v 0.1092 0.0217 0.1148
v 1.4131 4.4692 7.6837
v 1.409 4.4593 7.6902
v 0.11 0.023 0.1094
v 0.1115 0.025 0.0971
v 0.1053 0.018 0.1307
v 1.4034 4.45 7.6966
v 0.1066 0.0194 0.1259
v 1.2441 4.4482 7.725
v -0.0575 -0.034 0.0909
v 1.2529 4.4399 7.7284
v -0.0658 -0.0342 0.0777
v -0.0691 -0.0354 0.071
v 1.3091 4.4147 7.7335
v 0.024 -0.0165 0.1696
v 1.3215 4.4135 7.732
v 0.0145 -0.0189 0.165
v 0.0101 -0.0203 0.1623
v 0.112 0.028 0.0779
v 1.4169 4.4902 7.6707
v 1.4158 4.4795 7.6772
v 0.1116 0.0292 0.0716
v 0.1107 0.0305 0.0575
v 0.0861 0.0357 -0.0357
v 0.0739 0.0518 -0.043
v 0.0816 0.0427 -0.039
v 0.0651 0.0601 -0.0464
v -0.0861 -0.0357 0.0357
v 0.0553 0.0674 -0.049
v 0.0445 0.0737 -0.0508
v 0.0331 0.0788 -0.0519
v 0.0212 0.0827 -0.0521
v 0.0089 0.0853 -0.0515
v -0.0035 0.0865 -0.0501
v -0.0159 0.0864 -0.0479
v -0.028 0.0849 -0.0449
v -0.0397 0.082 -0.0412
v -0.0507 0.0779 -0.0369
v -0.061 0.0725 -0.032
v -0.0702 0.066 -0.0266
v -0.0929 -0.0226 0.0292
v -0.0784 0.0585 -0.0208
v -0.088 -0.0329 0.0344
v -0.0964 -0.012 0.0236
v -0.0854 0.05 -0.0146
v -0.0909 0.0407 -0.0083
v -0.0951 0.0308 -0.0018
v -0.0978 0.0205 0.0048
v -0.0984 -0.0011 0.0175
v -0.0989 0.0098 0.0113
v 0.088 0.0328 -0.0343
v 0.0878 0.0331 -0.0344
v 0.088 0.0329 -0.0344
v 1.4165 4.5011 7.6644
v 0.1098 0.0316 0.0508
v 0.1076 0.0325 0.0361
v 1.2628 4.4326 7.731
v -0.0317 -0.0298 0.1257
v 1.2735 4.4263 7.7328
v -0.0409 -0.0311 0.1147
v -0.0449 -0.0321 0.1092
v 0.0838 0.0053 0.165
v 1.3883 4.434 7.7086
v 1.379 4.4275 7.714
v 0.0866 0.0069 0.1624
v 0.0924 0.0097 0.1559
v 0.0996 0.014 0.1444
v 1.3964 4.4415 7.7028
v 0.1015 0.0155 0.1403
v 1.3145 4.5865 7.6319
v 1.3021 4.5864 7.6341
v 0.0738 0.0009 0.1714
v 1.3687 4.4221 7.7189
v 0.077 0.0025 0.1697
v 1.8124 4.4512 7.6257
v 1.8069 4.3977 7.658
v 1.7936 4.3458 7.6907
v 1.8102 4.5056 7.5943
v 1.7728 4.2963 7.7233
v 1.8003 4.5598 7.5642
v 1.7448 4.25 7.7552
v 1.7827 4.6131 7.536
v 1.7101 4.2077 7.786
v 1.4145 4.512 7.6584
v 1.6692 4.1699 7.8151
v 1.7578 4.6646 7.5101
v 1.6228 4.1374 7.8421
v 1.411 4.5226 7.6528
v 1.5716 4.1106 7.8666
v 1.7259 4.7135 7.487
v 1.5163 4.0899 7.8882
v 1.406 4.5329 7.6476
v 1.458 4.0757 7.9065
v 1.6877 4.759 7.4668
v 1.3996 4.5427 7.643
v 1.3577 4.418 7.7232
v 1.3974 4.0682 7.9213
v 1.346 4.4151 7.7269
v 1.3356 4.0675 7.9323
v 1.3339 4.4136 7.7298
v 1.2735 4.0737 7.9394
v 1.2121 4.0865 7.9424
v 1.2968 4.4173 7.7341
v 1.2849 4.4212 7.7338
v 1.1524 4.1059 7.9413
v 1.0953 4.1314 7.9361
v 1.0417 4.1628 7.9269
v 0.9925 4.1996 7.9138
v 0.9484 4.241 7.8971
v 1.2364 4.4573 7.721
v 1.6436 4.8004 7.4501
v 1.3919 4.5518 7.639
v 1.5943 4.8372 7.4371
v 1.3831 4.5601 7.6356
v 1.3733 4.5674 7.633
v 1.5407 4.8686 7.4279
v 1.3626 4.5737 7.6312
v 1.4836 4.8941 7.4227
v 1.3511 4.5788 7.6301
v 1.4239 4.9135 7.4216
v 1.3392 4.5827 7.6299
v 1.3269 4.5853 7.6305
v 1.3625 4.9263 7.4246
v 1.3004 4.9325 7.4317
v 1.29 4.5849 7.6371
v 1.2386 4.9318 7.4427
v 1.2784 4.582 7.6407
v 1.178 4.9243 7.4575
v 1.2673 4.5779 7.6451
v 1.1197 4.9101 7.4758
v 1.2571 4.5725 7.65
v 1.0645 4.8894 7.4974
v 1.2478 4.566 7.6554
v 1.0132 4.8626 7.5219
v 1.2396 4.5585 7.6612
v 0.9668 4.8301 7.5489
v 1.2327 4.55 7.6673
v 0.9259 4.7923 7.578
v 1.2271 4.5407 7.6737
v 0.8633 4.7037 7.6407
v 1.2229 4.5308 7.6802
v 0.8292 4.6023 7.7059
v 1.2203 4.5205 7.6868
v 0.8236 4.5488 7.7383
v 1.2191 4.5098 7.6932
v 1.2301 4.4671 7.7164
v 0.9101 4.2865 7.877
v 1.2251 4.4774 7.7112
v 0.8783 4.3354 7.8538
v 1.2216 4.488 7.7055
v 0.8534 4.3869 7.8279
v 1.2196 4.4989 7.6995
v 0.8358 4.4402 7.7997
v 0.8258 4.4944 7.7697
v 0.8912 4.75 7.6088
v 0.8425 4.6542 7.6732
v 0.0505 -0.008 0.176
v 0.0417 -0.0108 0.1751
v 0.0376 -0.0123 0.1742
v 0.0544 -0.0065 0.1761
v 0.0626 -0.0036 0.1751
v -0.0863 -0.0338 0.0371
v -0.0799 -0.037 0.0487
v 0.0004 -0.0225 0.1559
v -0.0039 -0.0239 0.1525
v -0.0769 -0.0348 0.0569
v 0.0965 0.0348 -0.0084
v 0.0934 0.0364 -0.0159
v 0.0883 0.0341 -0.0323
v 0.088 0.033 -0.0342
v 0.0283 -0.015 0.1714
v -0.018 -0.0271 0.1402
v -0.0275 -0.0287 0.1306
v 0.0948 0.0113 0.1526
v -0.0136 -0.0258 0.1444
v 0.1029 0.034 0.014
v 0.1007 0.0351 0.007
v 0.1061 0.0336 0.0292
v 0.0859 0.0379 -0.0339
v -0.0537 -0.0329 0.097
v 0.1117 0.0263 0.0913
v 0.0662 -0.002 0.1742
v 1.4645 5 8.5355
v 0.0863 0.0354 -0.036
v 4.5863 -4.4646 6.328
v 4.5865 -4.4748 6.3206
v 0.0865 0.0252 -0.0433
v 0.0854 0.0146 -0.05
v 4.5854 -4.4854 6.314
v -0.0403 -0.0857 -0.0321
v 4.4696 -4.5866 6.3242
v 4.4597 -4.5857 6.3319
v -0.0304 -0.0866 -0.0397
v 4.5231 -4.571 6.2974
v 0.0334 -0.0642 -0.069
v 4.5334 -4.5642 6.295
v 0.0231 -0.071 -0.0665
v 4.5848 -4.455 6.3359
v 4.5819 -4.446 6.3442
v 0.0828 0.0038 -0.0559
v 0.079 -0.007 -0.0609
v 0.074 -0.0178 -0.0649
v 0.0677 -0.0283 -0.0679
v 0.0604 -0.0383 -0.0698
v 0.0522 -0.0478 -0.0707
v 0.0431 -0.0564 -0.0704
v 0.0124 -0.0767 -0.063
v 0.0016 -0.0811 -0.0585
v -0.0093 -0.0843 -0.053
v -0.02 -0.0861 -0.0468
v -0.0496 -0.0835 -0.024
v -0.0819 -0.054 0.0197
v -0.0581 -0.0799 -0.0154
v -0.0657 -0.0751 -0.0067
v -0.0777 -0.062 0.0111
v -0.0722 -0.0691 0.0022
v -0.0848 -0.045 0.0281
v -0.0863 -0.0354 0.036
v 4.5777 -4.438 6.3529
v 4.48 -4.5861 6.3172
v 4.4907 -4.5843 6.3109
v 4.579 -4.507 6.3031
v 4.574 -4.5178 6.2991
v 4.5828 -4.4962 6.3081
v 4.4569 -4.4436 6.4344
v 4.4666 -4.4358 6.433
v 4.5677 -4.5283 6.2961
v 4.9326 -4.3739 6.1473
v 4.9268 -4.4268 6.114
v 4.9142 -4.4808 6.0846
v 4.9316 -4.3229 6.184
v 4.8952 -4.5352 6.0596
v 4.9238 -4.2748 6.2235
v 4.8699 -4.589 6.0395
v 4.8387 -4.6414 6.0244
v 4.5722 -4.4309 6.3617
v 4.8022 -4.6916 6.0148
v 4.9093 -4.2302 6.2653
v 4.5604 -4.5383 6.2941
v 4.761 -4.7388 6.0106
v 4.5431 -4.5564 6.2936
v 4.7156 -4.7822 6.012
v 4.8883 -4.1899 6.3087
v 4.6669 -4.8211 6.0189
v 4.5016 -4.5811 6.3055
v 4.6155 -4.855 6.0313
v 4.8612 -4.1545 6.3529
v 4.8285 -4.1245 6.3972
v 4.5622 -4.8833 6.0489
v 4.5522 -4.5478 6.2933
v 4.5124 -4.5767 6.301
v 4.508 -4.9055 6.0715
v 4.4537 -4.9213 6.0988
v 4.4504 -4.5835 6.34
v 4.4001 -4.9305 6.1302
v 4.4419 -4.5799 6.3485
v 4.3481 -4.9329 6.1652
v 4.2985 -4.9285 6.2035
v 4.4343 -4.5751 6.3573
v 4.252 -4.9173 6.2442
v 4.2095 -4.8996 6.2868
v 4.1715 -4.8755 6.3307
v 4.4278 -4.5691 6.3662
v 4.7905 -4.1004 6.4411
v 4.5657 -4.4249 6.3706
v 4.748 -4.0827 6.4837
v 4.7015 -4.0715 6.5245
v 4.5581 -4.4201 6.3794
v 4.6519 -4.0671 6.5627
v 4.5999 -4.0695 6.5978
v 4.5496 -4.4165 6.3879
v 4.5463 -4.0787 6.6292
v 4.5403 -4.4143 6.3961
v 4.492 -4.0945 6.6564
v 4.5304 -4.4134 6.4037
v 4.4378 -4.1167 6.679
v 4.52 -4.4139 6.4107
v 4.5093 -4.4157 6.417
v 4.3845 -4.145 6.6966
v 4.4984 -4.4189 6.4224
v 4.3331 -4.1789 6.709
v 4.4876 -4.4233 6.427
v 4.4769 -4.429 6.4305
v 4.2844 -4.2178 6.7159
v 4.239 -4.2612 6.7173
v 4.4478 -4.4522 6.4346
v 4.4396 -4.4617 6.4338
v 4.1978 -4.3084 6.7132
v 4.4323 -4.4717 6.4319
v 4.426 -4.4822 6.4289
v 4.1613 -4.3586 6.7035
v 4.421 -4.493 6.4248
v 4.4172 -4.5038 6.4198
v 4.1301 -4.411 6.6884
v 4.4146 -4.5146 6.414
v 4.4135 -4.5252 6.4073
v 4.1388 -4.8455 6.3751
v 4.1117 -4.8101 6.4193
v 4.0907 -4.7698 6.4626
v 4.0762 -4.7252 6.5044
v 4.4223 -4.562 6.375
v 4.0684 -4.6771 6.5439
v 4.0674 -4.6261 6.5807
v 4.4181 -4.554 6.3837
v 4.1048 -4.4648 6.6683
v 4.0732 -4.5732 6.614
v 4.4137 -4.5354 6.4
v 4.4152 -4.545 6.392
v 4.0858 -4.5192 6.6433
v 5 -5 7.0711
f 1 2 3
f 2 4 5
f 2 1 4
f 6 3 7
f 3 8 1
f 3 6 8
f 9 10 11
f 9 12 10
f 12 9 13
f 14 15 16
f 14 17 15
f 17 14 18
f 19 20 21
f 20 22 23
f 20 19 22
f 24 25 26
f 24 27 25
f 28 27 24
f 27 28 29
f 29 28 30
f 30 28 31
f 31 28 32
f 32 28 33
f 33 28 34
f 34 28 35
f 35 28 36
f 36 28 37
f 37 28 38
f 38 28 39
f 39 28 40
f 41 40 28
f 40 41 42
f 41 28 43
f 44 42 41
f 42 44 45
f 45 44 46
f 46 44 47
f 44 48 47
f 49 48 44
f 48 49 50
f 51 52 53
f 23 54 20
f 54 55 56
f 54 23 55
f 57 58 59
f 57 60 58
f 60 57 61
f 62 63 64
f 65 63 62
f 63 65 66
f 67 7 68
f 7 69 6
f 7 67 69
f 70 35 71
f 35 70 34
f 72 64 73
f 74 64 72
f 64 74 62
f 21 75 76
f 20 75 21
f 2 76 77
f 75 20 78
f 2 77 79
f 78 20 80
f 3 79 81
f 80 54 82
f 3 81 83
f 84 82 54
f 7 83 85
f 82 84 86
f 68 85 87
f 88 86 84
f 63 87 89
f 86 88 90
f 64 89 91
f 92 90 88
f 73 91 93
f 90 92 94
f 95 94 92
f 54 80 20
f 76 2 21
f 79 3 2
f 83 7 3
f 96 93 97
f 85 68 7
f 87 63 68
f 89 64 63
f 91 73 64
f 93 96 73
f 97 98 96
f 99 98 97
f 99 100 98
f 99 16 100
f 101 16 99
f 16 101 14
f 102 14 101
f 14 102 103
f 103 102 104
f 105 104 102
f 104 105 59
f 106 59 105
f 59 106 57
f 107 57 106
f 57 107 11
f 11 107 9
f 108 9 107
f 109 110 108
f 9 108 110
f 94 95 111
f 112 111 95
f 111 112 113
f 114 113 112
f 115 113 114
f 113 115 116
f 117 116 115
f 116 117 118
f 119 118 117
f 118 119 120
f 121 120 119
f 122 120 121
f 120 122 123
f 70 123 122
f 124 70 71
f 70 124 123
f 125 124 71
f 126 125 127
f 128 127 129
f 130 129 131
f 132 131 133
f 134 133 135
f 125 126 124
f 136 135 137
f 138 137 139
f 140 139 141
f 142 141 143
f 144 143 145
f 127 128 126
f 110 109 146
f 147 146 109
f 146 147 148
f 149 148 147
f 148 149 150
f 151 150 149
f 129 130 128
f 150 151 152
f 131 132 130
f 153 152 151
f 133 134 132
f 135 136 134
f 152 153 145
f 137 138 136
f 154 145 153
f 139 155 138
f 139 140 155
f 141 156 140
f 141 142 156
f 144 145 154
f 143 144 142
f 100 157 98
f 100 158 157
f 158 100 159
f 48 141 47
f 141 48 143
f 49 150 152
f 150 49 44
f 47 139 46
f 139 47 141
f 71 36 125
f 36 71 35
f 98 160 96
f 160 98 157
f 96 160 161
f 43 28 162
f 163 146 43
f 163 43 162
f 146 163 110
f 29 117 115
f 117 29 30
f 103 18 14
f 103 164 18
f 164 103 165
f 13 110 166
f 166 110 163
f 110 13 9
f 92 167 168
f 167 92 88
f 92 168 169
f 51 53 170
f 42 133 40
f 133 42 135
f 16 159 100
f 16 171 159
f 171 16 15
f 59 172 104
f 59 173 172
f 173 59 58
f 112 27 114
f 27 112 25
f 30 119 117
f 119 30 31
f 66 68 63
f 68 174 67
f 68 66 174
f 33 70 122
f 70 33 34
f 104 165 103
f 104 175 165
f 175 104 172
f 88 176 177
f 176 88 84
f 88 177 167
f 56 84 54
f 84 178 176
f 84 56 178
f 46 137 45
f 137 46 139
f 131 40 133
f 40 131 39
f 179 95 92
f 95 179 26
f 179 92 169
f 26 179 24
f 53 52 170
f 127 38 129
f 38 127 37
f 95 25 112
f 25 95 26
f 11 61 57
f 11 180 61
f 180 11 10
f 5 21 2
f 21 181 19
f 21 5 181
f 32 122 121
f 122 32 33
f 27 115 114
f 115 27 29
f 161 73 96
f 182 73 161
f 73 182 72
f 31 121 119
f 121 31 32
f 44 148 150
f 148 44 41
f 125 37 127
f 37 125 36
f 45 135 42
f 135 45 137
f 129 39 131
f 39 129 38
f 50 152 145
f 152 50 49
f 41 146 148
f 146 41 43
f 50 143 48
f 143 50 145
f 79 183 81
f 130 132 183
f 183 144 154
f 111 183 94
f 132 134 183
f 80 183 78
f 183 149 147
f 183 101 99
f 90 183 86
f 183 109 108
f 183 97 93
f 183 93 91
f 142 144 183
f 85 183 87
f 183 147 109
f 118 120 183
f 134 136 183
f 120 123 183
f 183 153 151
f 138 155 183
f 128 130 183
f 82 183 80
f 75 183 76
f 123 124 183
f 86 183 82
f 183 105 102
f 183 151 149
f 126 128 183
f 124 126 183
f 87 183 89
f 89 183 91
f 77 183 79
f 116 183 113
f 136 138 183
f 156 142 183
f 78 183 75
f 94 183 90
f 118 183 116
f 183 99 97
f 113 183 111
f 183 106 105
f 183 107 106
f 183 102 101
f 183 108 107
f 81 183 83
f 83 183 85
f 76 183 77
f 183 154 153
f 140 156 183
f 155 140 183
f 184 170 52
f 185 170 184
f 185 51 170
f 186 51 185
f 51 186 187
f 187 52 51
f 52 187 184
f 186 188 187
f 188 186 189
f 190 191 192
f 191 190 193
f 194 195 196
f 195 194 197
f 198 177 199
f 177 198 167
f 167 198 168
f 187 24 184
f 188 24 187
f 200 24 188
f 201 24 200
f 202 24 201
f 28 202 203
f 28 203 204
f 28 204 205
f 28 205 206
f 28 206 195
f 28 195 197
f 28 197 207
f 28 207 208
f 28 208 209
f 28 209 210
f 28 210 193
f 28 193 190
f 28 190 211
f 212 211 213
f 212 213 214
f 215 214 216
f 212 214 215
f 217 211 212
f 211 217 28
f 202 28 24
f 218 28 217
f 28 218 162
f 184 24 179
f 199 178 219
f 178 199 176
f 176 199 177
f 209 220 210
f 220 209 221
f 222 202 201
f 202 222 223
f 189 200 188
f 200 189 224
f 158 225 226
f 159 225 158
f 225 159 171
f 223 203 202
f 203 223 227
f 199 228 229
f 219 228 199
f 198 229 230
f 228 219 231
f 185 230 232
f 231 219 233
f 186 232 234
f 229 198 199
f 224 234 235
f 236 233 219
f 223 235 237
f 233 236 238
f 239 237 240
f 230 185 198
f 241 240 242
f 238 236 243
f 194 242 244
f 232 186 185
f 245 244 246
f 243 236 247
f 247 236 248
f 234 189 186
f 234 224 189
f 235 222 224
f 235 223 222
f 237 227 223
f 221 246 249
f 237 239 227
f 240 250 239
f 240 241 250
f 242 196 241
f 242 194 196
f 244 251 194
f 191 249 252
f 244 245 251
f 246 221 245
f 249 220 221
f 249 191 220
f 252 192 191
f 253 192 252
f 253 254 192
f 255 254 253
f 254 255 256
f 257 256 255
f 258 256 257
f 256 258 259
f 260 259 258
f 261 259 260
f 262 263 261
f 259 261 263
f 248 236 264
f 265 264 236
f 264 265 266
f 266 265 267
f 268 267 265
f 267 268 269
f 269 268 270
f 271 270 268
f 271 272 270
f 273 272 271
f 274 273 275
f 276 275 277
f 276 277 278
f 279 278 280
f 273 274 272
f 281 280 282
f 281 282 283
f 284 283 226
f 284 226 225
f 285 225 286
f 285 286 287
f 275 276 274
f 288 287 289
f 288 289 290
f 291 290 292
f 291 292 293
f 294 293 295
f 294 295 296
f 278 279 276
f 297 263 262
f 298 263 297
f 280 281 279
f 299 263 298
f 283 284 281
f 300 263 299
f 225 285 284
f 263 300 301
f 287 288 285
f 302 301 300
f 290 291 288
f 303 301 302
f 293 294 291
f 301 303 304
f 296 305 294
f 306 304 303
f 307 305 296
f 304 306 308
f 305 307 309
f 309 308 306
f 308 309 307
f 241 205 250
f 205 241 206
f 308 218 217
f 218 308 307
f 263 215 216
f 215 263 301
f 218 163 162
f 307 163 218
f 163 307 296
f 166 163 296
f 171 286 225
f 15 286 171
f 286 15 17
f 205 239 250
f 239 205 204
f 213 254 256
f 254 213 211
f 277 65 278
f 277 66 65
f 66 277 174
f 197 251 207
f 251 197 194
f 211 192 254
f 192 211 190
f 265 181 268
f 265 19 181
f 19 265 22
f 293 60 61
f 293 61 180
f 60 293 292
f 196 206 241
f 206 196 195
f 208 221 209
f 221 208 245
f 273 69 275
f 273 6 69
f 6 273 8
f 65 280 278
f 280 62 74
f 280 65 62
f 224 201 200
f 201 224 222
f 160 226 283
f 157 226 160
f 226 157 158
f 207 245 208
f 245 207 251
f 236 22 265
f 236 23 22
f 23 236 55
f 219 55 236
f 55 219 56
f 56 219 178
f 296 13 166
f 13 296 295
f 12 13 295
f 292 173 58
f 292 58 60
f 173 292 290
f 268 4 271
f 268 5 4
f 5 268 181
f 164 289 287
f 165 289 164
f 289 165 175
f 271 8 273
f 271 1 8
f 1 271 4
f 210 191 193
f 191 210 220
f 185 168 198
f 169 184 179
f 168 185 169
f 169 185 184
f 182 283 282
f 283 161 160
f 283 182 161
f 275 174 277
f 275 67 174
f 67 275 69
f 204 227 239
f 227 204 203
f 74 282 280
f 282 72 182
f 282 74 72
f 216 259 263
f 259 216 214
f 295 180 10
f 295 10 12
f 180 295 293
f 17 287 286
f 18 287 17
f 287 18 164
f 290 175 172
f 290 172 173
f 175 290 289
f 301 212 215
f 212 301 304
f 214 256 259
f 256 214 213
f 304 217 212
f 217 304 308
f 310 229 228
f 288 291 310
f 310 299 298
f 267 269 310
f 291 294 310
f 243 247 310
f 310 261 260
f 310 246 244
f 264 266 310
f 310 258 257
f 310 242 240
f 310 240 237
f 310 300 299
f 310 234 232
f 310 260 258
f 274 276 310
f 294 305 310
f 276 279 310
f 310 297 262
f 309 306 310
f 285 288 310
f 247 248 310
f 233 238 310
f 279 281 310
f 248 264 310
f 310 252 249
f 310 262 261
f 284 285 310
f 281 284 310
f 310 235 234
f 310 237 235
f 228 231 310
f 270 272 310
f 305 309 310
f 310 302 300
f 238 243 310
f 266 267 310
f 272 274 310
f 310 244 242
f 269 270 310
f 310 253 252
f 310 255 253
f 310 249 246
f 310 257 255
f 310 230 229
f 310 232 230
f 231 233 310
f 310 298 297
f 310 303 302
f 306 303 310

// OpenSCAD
$fn=50;
module u(){color("red")cylinder(h=9,r=0.1);color("red")translate([0,0,9])cylinder(h=1,r1=0.5,r2=0);}
module v(){color("green")cylinder(h=9,r=0.1);color("green")translate([0,0,9])cylinder(h=1,r1=0.5,r2=0);}

rotate(a=-45, v=[1,0,1])u();
rotate(a=45, v=[1,1,0])v();

u=[4,0];
v=[-4,4];
wadd=u+v;
wmul=u*v;
echo (u,v,wadd,wmul);
echo(u[0],u[1]);
function wedge(u,v)=u[0]*v[1]-u[1]*v[0];
wout=wedge(u,v);
echo (wout);

module dot(){circle(0.25);};
color("black")dot();
translate(u)color("red")dot();
translate(v)color("blue")dot();
translate(wadd)dot();

translate(wadd+[1,0])text(str("u = ",u,"   norm = ",sqrt(u*u)),size=1);
translate(wadd+[1,-2])text(str("v = ",v,"   norm = ",sqrt(v*v)),size=1);
translate(wadd+[1,-4])text(str("inner = ",wmul,"      cosine = ",wmul/(sqrt(u*u)*sqrt(v*v))),size=1);
translate(wadd+[1,-6])text(str("outer = ",wout,"      sine = ",wout/(sqrt(u*u)*sqrt(v*v))),size=1);

s=[wmul,u,v,wout];
echo(s);
